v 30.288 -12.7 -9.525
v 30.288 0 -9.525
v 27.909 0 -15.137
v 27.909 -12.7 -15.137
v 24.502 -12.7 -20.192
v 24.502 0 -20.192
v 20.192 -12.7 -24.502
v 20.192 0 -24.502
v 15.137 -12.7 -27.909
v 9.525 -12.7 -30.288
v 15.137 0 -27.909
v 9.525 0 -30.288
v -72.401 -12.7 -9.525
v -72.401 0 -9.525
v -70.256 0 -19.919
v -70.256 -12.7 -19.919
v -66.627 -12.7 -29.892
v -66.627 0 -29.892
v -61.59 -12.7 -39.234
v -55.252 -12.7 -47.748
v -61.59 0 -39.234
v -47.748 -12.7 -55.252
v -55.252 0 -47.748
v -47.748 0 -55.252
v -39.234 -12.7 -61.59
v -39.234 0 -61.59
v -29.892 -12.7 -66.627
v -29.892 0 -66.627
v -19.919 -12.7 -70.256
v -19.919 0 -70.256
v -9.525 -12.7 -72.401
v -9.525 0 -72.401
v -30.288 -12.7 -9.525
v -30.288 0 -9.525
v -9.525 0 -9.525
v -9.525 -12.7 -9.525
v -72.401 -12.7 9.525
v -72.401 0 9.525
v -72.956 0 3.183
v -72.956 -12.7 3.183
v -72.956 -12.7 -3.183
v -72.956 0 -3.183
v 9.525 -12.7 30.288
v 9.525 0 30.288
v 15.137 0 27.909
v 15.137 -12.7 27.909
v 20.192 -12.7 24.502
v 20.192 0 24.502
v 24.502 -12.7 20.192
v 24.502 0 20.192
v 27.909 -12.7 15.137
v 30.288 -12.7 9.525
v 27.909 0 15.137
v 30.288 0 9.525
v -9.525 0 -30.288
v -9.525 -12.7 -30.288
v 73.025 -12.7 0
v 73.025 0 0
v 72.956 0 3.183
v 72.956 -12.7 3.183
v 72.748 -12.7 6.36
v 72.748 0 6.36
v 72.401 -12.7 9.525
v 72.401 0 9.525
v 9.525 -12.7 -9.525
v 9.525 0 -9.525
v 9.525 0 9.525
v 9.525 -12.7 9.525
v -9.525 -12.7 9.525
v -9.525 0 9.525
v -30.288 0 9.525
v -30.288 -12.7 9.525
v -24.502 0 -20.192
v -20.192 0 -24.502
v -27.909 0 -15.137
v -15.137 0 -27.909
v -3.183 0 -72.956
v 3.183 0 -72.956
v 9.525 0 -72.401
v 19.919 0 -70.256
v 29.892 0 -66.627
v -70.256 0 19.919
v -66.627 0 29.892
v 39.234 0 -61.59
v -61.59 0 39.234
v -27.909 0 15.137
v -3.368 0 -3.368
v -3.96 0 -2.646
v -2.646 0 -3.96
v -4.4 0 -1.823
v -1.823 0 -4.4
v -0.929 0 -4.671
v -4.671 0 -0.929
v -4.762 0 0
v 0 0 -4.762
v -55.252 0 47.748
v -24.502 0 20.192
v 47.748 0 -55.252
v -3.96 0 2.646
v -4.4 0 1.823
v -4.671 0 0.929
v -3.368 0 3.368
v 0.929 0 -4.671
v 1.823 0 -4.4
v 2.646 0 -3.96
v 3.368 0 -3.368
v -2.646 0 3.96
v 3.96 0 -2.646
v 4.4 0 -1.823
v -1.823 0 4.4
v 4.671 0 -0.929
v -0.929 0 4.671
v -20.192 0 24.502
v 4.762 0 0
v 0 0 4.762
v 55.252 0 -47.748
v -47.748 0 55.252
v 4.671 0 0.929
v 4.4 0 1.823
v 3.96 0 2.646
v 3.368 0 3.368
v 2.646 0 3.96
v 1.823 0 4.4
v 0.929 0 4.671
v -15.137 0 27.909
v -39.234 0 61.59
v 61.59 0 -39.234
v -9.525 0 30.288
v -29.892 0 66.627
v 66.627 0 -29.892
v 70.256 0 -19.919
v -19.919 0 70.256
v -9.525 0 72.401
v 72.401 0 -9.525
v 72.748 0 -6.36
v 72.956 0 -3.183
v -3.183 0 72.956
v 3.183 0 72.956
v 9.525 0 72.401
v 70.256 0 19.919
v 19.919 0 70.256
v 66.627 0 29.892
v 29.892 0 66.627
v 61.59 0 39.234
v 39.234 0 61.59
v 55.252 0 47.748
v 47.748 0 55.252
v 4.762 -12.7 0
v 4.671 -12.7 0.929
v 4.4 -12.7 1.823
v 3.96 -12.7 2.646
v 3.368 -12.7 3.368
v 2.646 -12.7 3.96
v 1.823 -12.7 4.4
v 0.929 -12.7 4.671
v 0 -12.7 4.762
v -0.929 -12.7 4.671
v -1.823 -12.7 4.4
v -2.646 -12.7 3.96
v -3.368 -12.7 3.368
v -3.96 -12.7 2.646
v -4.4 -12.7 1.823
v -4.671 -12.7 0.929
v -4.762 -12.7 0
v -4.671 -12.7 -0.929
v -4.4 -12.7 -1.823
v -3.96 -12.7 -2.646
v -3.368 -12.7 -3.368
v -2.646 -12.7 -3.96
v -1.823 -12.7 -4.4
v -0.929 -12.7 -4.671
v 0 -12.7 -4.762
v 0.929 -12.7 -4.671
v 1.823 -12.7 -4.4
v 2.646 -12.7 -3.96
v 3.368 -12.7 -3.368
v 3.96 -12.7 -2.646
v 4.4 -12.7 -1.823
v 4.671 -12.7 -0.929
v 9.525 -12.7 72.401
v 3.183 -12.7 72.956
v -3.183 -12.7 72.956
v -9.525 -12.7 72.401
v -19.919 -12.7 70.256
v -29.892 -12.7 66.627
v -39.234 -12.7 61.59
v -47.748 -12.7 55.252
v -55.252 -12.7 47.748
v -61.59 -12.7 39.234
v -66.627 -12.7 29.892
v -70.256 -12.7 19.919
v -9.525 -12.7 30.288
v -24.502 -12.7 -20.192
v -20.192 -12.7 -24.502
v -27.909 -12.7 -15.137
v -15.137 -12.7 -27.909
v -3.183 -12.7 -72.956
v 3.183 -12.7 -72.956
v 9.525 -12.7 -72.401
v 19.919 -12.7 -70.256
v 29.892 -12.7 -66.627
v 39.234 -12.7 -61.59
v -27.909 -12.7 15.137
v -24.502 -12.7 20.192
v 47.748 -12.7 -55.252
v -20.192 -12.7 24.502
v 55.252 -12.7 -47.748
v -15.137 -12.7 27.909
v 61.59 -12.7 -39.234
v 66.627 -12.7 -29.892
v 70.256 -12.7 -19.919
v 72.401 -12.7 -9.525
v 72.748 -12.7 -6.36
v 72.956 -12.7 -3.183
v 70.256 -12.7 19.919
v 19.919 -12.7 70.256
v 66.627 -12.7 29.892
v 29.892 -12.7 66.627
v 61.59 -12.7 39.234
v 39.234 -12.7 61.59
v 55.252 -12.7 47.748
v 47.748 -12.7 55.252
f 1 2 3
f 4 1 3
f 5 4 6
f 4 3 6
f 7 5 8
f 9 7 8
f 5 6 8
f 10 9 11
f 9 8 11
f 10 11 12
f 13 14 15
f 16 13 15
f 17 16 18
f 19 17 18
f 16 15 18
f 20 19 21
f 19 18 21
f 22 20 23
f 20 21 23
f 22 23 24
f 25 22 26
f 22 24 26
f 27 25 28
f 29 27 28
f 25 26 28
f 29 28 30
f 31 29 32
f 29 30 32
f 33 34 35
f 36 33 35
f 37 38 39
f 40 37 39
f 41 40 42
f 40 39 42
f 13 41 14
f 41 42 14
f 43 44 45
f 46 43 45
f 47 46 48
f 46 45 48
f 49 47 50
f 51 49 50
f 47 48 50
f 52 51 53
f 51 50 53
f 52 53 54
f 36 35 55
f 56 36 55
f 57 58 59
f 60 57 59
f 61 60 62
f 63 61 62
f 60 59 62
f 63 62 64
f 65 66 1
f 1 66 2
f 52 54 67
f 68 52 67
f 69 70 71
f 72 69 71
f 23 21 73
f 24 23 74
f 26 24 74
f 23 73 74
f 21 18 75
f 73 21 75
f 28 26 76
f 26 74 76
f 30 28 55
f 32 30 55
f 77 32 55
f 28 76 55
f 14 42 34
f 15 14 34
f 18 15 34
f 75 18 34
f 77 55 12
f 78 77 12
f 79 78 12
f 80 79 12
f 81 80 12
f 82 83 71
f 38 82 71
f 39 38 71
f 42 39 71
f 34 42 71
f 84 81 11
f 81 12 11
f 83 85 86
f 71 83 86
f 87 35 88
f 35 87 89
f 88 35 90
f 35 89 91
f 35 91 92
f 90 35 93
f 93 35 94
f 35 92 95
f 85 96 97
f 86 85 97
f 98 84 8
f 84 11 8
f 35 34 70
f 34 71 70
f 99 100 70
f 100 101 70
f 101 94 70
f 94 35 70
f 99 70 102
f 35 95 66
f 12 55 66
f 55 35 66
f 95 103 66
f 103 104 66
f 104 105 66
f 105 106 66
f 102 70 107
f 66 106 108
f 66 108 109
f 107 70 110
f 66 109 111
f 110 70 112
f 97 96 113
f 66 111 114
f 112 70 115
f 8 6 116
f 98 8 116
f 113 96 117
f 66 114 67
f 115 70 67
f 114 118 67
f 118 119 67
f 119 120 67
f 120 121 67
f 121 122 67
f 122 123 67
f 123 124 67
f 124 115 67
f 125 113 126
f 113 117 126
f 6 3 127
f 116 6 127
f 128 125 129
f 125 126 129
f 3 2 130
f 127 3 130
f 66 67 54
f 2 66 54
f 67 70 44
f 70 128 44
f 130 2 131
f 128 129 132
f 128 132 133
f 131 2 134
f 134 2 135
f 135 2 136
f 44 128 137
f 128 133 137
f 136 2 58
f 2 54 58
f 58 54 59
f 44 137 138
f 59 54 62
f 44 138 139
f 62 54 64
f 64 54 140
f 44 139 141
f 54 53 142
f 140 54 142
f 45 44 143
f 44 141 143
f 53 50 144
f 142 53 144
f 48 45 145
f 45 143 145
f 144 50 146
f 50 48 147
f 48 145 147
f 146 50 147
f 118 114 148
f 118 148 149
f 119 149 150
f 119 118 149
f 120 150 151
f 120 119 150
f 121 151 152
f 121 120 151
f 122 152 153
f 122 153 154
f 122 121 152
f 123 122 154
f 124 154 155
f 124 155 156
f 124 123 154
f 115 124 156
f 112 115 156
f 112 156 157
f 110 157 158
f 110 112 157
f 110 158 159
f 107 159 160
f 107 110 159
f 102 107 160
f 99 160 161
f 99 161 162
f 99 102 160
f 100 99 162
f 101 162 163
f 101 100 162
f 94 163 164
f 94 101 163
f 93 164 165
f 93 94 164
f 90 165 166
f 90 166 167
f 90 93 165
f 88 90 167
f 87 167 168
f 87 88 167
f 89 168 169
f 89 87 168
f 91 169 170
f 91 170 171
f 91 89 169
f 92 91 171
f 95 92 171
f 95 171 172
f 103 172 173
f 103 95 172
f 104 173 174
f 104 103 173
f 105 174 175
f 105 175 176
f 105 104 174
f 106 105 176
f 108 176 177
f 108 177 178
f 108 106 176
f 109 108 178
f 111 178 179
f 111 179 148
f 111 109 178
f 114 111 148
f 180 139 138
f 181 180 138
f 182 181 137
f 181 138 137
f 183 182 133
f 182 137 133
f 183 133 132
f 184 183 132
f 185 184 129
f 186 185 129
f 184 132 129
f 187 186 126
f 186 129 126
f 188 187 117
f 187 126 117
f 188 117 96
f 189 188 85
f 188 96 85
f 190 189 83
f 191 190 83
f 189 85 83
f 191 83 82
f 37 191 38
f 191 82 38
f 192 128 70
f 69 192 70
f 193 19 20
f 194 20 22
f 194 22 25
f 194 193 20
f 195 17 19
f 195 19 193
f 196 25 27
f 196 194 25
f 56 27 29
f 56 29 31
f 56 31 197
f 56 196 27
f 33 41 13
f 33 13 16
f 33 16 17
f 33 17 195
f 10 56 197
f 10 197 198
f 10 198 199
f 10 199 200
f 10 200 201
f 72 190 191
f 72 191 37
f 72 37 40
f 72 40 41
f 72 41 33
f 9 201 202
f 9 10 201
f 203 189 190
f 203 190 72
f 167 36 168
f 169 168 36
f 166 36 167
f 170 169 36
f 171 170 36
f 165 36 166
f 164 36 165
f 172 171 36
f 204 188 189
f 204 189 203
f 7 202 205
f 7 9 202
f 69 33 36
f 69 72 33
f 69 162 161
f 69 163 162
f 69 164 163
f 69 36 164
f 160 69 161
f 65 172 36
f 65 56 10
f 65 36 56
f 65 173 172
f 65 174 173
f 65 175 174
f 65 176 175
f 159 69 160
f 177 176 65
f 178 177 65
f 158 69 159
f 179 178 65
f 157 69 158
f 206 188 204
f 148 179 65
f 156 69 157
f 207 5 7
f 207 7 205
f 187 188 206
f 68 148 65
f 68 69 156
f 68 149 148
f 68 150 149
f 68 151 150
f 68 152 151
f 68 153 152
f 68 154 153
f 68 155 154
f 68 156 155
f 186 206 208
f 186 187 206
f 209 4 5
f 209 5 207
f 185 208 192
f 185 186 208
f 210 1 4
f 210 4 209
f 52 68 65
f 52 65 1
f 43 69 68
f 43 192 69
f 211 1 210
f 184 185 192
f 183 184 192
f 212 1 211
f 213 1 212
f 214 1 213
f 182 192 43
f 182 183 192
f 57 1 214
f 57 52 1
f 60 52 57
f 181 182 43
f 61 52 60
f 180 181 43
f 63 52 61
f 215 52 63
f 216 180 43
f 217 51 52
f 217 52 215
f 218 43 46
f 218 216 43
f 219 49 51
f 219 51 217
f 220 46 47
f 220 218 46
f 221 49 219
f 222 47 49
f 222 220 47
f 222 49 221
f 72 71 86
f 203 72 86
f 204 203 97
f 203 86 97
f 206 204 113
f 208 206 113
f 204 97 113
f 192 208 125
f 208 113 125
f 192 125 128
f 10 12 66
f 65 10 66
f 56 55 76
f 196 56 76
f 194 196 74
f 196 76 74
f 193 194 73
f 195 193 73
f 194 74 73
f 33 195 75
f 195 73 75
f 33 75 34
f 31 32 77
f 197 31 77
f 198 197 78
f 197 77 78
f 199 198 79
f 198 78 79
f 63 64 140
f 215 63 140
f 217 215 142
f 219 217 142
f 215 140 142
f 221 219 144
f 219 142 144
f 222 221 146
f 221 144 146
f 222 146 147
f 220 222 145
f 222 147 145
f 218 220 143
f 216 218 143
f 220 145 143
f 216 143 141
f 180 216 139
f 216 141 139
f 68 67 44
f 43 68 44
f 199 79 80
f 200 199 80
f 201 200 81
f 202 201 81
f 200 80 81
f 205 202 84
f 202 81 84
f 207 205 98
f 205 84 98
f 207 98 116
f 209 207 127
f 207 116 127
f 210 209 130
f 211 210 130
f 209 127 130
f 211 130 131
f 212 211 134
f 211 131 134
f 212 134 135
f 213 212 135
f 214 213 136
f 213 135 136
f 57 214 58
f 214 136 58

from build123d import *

# Parameters (mm, degrees)
F0_W     = 19.05
F0_H     = 19.05
F0_R     = 4.7625
F1_DEPTH = 12.7


with BuildPart() as f1:
    # F0 (on Front) → F1 (new body)
    with BuildSketch(Plane.XZ):
        with BuildLine():
            ThreePointArc((72.4011394938, -9.525), (72.8688679634, -4.7727043416), (73.025, 0))
            ThreePointArc((73.025, 0), (72.8688679634, 4.7727043416), (72.4011394938, 9.525))
            Line((72.4011394938, 9.525), (30.287569645, 9.525))
            ThreePointArc((30.287569645, 9.525), (31.3822627947, 4.8183069522), (31.75, 0))
            ThreePointArc((31.75, 0), (31.3822627947, -4.8183069522), (30.287569645, -9.525))
            Line((30.287569645, -9.525), (72.4011394938, -9.525))
        make_face()
        with BuildLine():
            Line((30.287569645, 9.525), (72.4011394938, 9.525))
            ThreePointArc((72.4011394938, 9.525), (51.6364726961, 51.6364726961), (9.525, 72.4011394938))
            Line((9.525, 72.4011394938), (9.525, 30.287569645))
            ThreePointArc((9.525, 30.287569645), (22.4506403027, 22.4506403027), (30.287569645, 9.525))
        make_face()
        with BuildLine():
            ThreePointArc((9.525, -72.4011394938), (51.6364726961, -51.6364726961), (72.4011394938, -9.525))
            Line((72.4011394938, -9.525), (30.287569645, -9.525))
            ThreePointArc((30.287569645, -9.525), (22.4506403027, -22.4506403027), (9.525, -30.287569645))
            Line((9.525, -30.287569645), (9.525, -72.4011394938))
        make_face()
        with BuildLine():
            Line((9.525, 30.287569645), (9.525, 72.4011394938))
            ThreePointArc((9.525, 72.4011394938), (0, 73.025), (-9.525, 72.4011394938))
            Line((-9.525, 72.4011394938), (-9.525, 30.287569645))
            ThreePointArc((-9.525, 30.287569645), (0, 31.75), (9.525, 30.287569645))
        make_face()
        with BuildLine():
            ThreePointArc((-9.525, -72.4011394938), (0, -73.025), (9.525, -72.4011394938))
            Line((9.525, -72.4011394938), (9.525, -30.287569645))
            ThreePointArc((9.525, -30.287569645), (0, -31.75), (-9.525, -30.287569645))
            Line((-9.525, -30.287569645), (-9.525, -72.4011394938))
        make_face()
        with BuildLine():
            Line((-9.525, 30.287569645), (-9.525, 72.4011394938))
            ThreePointArc((-9.525, 72.4011394938), (-51.6364726961, 51.6364726961), (-72.4011394938, 9.525))
            Line((-72.4011394938, 9.525), (-30.287569645, 9.525))
            ThreePointArc((-30.287569645, 9.525), (-22.4506403027, 22.4506403027), (-9.525, 30.287569645))
        make_face()
        with BuildLine():
            ThreePointArc((-72.4011394938, -9.525), (-51.6364726961, -51.6364726961), (-9.525, -72.4011394938))
            Line((-9.525, -72.4011394938), (-9.525, -30.287569645))
            ThreePointArc((-9.525, -30.287569645), (-22.4506403027, -22.4506403027), (-30.287569645, -9.525))
            Line((-30.287569645, -9.525), (-72.4011394938, -9.525))
        make_face()
        with BuildLine():
            Line((-30.287569645, 9.525), (-72.4011394938, 9.525))
            ThreePointArc((-72.4011394938, 9.525), (-73.025, 0), (-72.4011394938, -9.525))
            Line((-72.4011394938, -9.525), (-30.287569645, -9.525))
            ThreePointArc((-30.287569645, -9.525), (-31.75, 0), (-30.287569645, 9.525))
        make_face()
        with BuildLine():
            ThreePointArc((31.75, 0), (31.3822627947, 4.8183069522), (30.287569645, 9.525))
            Line((30.287569645, 9.525), (9.525, 9.525))
            Line((9.525, 9.525), (9.525, -9.525))
            Line((9.525, -9.525), (30.287569645, -9.525))
            ThreePointArc((30.287569645, -9.525), (31.3822627947, -4.8183069522), (31.75, 0))
        make_face()
        with BuildLine():
            Line((9.525, 9.525), (9.525, 30.287569645))
            ThreePointArc((9.525, 30.287569645), (0, 31.75), (-9.525, 30.287569645))
            Line((-9.525, 30.287569645), (-9.525, 9.525))
            Line((-9.525, 9.525), (9.525, 9.525))
        make_face()
        with BuildLine():
            Line((-9.525, -9.525), (-9.525, 9.525))
            Line((-9.525, 9.525), (-30.287569645, 9.525))
            ThreePointArc((-30.287569645, 9.525), (-31.75, 0), (-30.287569645, -9.525))
            Line((-30.287569645, -9.525), (-9.525, -9.525))
        make_face()
        Rectangle(F0_W, F0_H)
        Circle(F0_R, mode=Mode.SUBTRACT)
        with BuildLine():
            ThreePointArc((-9.525, -30.287569645), (0, -31.75), (9.525, -30.287569645))
            Line((9.525, -30.287569645), (9.525, -9.525))
            Line((9.525, -9.525), (-9.525, -9.525))
            Line((-9.525, -9.525), (-9.525, -30.287569645))
        make_face()
    extrude(amount=F1_DEPTH)


solid = f1.part
